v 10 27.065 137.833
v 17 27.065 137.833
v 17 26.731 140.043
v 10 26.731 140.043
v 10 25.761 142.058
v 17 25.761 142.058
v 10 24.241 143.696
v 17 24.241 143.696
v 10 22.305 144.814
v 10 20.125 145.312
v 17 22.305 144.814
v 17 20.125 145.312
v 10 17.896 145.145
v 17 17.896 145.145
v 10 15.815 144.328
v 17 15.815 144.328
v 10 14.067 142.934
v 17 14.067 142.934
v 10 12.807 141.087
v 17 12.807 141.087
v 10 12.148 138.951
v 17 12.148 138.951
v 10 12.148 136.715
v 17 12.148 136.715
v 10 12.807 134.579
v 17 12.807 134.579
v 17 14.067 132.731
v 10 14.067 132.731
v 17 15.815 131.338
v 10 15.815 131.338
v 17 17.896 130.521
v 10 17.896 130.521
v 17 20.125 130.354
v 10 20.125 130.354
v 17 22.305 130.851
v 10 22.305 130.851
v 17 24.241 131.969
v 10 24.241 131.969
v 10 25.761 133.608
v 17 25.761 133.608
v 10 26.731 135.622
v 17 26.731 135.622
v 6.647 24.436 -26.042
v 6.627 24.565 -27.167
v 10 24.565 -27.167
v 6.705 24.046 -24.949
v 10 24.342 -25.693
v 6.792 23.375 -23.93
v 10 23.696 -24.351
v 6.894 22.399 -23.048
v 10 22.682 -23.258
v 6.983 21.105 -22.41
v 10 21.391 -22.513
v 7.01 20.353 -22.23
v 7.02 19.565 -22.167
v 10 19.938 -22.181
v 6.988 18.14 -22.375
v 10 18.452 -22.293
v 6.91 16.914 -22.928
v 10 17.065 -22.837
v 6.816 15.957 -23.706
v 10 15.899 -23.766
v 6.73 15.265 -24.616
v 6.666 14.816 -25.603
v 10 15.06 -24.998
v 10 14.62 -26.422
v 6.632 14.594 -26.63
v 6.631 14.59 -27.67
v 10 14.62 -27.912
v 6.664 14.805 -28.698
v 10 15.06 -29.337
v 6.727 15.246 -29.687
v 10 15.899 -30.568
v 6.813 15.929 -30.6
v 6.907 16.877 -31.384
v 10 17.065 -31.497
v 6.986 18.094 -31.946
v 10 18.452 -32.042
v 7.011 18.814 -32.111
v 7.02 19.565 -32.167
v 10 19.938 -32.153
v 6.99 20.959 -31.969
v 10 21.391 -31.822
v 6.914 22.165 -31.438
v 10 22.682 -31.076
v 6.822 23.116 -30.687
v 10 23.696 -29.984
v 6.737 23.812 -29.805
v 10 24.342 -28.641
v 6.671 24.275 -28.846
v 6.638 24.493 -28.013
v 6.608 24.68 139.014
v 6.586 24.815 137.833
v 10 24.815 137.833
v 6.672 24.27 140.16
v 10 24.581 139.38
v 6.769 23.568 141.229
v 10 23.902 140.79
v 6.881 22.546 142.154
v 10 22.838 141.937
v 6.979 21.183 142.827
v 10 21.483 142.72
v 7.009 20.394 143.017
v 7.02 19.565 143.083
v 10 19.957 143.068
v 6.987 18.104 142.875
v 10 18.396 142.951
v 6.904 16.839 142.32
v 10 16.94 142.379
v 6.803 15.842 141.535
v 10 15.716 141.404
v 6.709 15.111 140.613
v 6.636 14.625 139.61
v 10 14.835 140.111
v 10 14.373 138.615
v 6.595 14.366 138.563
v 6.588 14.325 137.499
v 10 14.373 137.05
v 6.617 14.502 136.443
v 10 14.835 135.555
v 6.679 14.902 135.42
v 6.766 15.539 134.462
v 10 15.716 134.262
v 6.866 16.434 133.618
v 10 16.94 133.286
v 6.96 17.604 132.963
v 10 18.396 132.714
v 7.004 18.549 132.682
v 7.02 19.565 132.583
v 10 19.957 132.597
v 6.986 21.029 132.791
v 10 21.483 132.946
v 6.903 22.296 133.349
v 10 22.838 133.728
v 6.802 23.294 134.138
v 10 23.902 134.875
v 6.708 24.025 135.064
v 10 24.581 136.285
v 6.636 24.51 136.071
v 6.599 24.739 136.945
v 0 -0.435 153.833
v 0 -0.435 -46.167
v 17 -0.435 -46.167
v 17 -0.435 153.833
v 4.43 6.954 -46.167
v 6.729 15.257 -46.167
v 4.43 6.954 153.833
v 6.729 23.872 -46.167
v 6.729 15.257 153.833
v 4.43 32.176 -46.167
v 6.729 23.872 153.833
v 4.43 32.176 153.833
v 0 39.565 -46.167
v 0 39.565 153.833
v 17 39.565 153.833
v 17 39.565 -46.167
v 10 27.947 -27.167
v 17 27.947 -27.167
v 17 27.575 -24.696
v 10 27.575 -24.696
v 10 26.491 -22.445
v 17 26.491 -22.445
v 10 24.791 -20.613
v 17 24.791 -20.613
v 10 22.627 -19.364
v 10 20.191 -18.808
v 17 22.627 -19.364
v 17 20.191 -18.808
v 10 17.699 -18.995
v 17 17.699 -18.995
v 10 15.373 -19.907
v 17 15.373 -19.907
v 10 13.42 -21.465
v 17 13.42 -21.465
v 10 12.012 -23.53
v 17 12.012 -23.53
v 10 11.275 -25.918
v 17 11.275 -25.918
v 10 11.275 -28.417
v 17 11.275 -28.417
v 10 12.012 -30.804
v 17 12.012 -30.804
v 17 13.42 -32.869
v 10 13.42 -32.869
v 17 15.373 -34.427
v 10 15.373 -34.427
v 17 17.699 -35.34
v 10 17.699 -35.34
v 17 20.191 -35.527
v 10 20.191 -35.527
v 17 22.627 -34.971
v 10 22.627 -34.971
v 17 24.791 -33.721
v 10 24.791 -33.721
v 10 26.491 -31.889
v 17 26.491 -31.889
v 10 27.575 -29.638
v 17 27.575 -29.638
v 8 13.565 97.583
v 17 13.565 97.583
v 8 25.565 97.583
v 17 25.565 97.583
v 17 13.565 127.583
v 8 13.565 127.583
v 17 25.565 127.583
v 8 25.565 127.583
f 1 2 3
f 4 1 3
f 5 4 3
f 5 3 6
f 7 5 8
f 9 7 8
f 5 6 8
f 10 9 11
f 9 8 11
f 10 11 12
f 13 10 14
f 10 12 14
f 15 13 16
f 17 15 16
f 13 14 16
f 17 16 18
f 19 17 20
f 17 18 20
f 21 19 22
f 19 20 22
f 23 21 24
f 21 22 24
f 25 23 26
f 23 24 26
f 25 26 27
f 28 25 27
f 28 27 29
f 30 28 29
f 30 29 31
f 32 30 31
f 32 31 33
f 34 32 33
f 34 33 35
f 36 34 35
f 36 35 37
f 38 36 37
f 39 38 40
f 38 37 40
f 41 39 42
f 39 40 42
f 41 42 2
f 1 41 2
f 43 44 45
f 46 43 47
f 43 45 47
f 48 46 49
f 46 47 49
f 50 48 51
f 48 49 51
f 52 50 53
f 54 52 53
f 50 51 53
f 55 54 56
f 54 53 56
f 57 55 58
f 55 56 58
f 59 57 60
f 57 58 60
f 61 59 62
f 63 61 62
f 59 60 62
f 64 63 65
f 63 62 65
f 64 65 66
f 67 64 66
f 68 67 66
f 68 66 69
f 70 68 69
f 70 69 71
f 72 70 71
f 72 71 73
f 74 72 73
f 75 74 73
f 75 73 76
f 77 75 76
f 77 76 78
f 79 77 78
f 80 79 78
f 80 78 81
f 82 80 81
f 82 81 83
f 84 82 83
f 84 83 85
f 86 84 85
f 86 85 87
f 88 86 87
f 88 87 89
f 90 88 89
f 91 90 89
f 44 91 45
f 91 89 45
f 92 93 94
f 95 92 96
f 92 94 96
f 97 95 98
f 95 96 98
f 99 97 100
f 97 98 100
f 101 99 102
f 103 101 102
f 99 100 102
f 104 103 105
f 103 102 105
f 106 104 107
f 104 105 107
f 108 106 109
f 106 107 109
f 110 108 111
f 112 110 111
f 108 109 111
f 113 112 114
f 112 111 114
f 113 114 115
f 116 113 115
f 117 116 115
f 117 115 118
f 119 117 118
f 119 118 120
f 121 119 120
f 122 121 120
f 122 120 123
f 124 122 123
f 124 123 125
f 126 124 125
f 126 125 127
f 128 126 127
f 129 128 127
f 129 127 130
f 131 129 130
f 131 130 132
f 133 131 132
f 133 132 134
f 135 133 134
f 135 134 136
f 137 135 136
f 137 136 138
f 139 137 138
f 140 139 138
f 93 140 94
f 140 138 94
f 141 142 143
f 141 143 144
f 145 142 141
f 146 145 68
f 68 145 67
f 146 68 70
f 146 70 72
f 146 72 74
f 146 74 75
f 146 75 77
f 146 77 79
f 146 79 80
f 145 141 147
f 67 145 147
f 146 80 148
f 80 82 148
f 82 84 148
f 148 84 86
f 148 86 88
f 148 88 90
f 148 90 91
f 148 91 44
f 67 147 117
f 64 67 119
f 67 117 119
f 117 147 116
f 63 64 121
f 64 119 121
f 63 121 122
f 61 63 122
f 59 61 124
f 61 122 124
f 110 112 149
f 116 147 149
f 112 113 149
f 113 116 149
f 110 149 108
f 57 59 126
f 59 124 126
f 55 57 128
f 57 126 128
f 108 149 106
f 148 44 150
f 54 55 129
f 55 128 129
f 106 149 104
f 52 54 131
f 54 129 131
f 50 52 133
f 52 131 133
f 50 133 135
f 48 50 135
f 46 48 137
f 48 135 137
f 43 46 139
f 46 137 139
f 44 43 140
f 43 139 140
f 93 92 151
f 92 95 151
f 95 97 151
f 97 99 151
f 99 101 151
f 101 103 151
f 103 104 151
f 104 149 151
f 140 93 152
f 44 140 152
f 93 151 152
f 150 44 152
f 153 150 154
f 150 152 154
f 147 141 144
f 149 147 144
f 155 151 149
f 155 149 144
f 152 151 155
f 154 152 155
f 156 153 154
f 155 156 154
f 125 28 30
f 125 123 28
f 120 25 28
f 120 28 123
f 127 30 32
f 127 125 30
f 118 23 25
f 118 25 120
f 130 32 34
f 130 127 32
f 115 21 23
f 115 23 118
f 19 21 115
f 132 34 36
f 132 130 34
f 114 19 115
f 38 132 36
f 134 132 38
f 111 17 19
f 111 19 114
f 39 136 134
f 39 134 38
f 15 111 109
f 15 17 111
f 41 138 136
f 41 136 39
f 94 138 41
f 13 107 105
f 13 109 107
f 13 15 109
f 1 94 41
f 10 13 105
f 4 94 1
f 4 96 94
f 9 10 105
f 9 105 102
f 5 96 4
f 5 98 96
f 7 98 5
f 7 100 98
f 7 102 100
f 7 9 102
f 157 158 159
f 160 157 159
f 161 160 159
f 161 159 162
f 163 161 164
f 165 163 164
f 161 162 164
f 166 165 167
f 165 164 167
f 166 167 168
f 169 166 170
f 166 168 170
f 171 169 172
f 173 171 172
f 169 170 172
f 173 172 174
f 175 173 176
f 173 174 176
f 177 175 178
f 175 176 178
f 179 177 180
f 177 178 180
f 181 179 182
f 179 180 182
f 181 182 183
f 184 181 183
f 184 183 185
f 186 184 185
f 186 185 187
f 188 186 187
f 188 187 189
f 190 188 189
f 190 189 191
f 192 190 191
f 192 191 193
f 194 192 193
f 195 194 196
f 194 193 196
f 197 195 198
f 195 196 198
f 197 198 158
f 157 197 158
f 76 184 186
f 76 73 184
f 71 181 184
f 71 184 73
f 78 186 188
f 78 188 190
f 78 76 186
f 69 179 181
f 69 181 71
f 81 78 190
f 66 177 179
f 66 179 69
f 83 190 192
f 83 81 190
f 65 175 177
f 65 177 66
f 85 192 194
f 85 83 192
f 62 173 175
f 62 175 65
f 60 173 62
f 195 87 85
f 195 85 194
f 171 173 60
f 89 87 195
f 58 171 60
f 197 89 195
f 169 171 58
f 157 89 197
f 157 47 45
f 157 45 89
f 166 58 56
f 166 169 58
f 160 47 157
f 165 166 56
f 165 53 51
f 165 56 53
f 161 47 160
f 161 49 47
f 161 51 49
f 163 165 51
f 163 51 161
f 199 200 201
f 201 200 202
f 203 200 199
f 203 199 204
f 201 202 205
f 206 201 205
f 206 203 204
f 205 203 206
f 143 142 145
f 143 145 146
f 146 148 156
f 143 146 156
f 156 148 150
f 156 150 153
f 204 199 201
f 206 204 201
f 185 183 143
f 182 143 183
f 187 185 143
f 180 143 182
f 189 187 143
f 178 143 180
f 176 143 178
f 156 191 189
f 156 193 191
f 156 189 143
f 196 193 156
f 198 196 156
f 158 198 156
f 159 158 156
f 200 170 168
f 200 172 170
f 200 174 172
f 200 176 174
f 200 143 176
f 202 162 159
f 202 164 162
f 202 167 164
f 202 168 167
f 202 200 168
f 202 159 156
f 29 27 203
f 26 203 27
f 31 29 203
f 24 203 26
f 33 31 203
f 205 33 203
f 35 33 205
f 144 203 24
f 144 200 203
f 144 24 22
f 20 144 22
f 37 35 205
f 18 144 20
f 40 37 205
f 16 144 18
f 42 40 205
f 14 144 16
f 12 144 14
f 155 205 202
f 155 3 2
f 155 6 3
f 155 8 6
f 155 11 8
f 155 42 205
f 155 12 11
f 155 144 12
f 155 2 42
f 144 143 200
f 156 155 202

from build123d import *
from build123d import SkipClean  # not in build123d's __all__

# Parameters (mm, degrees)
F0_W      = 40
F0_H      = 200
F1_DEPTH  = 17
F2_R      = 32
F3_DEPTH  = 187
F4_DEPTH  = 195
F5_R      = 8.3828490824
F5_R_2    = 7.5
F6_DEPTH  = 7
F7_R      = 5
F7_R_2    = 5.25
F8_DEPTH  = 25
F9_W      = 12
F9_H      = 30
F10_DEPTH = 9


with BuildPart() as f1:
    # F0 (on Right) → F1 (new body)
    with BuildSketch(Plane.YZ):
        with Locations((19.5646310411, 53.8327481339)):
            Rectangle(F0_W, F0_H)
    extrude(amount=F1_DEPTH)

    # F2 (on Top) → F3 (cut, symmetric)
    with BuildSketch(Plane.XY):
        with Locations((-24.9799919936, 19.5646310411)):
            Circle(F2_R)
    extrude(amount=F3_DEPTH, both=True, mode=Mode.SUBTRACT)

    # F2 (on Top) → F4 (cut)
    with BuildSketch(Plane.XY):
        with Locations((-24.9799919936, 19.5646310411)):
            Circle(F2_R)
    extrude(amount=-F4_DEPTH, mode=Mode.SUBTRACT)

    # F5 (on face) → F6 (cut)
    with BuildSketch(Plane.YZ.offset(17)):
        with Locations((19.5646310411, -27.1672518661)):
            Circle(F5_R)
        with Locations((19.5646310411, 137.8327481339)):
            Circle(F5_R_2)
    extrude(amount=-F6_DEPTH, mode=Mode.SUBTRACT)

    # F7 (on face) → F8 (cut)
    with BuildSketch(Plane.YZ.offset(10)):
        with Locations((19.5646310411, -27.1672518661)):
            Circle(F7_R)
        with Locations((19.5646310411, 137.8327481339)):
            Circle(F7_R_2)
    with SkipClean():  # cleaning this boolean's faces spoils the solid; the shape is the same uncleaned
        extrude(amount=-F8_DEPTH, mode=Mode.SUBTRACT)

    # F9 (on face) → F10 (cut)
    with BuildSketch(Plane.YZ.offset(17)):
        with Locations((19.5646310411, 112.5827481339)):
            Rectangle(F9_W, F9_H)
    with SkipClean():  # cleaning this boolean's faces spoils the solid; the shape is the same uncleaned
        extrude(amount=-F10_DEPTH, mode=Mode.SUBTRACT)


solid = f1.part
